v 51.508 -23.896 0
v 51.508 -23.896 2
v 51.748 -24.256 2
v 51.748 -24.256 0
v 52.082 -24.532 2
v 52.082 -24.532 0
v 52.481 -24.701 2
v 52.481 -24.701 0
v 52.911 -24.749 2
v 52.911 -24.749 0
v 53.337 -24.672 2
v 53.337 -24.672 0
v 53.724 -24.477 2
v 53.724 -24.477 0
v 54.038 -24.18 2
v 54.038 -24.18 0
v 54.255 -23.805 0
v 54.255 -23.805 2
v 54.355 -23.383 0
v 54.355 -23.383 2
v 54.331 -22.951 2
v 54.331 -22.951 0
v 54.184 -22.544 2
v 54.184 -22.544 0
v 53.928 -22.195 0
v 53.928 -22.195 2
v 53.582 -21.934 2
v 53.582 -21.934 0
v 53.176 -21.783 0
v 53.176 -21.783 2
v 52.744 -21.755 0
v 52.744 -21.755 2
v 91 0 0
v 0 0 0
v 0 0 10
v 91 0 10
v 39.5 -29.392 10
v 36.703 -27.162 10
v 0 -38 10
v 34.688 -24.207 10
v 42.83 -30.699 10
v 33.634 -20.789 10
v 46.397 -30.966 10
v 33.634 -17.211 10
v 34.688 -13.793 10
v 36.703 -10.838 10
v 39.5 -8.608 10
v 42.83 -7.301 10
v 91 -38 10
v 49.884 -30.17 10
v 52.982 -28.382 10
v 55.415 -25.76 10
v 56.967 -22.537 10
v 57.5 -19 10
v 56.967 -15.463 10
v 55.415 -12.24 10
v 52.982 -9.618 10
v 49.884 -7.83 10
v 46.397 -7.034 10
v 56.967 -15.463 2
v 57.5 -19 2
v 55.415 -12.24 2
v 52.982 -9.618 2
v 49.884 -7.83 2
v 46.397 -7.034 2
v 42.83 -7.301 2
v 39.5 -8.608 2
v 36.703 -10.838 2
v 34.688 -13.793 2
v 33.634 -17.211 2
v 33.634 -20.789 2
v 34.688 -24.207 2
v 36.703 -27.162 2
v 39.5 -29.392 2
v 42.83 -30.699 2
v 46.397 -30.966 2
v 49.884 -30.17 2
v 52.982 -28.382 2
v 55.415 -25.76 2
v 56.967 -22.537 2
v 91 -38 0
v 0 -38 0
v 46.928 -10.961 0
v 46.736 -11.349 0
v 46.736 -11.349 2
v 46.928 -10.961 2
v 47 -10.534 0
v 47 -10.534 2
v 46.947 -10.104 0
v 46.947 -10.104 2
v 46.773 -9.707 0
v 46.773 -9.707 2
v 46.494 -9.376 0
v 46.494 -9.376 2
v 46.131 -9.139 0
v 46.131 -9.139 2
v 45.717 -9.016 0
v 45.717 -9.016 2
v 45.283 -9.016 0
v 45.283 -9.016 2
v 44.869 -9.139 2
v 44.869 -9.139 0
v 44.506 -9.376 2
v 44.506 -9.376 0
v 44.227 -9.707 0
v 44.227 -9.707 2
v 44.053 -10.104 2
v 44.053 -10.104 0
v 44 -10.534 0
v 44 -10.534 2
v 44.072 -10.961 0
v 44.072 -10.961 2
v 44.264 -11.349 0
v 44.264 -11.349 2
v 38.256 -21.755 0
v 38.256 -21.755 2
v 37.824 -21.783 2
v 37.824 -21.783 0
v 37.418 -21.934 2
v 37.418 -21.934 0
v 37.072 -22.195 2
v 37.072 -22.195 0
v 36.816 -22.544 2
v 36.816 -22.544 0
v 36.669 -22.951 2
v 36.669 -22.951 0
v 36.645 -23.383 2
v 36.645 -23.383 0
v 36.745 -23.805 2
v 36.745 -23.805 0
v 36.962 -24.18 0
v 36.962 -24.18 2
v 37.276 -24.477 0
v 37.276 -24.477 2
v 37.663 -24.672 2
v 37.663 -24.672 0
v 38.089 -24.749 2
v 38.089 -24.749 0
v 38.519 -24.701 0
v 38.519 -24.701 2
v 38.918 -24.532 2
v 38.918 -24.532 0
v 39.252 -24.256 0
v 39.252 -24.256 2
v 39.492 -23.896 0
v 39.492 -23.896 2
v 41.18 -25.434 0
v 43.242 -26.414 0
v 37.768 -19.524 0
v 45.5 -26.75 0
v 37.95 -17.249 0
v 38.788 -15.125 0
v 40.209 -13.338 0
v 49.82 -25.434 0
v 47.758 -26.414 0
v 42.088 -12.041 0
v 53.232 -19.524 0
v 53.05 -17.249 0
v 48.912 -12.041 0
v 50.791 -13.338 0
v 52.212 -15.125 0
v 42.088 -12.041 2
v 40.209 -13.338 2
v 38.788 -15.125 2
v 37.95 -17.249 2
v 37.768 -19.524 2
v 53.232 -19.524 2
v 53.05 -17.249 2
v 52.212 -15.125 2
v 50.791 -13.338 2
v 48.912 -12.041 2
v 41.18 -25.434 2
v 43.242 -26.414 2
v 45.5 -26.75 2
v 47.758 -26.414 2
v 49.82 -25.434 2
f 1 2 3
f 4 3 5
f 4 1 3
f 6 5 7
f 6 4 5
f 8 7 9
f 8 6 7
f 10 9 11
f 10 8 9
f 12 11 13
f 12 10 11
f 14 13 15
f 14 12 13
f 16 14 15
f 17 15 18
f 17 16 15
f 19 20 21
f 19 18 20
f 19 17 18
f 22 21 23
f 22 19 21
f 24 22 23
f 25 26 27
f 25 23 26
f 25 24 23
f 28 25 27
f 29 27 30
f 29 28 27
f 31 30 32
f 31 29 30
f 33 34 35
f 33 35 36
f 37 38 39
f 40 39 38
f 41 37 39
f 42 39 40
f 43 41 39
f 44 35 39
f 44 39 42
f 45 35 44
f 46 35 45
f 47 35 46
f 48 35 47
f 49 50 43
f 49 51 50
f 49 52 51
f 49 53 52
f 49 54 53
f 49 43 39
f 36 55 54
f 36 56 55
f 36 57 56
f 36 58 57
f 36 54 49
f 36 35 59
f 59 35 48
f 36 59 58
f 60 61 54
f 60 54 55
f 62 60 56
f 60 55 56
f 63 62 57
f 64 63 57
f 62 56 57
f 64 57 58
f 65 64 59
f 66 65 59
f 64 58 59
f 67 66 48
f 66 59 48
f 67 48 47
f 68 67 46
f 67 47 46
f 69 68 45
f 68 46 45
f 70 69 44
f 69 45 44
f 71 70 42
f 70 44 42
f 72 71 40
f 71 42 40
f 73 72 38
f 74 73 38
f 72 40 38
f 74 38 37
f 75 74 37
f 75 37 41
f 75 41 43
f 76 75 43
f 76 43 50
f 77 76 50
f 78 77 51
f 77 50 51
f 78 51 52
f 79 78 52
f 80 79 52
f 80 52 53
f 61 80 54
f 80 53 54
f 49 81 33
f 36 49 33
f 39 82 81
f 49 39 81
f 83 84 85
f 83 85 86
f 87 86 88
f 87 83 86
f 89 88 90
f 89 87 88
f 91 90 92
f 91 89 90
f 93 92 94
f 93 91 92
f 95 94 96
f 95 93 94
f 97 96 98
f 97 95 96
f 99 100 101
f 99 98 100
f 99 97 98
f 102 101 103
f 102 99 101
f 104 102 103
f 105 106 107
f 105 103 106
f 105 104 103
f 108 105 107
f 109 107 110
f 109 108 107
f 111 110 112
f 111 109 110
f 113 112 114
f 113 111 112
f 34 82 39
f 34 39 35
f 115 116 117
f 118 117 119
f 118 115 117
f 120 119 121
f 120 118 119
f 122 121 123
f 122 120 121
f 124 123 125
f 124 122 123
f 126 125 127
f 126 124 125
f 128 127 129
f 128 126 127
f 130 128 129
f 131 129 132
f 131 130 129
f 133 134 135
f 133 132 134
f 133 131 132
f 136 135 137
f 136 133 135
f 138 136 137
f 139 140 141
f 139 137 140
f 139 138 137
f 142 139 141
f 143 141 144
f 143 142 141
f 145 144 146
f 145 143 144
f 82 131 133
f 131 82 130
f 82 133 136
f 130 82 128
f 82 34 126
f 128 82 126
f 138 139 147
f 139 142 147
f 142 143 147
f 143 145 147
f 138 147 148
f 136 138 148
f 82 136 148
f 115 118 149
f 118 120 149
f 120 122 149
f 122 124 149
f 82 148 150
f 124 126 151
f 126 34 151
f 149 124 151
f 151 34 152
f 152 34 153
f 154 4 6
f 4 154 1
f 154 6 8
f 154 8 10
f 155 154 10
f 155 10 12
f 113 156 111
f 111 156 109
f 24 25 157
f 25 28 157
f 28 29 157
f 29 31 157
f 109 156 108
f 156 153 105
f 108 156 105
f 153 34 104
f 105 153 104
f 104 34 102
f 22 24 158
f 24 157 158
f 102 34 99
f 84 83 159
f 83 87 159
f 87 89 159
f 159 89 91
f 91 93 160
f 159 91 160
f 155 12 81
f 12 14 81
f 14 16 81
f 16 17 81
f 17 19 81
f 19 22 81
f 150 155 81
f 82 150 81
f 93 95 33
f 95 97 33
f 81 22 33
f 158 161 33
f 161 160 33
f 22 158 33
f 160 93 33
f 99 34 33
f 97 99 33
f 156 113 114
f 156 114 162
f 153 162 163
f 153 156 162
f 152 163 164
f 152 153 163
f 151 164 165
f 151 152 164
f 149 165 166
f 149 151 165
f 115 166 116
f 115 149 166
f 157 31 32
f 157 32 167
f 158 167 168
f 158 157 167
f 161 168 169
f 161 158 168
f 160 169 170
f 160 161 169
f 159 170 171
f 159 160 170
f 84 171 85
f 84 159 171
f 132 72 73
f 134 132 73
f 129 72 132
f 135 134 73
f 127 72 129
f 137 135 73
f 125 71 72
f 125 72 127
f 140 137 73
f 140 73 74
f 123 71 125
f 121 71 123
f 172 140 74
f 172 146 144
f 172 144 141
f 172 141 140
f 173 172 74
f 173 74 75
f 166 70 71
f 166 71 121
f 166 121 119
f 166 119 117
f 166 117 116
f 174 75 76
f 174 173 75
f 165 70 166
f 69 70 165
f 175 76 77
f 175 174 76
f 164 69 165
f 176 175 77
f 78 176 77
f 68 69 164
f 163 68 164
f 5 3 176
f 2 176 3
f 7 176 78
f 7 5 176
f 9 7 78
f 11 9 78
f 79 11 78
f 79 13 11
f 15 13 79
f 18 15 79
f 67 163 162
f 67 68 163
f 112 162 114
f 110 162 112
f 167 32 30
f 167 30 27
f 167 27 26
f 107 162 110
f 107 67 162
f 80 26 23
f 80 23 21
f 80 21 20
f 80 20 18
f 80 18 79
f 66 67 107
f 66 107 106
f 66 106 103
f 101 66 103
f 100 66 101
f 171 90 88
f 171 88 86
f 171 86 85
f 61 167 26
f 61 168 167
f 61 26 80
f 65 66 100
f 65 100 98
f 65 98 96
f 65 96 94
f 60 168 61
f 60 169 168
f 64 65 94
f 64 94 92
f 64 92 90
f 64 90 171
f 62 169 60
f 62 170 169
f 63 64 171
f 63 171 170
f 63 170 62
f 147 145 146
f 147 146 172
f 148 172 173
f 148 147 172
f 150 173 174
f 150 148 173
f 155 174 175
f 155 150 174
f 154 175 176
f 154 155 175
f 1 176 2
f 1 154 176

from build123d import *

# Parameters (mm, degrees)
ESQUISSE1_W      = 91
ESQUISSE1_H      = 38
EXTRUSION1_DEPTH = 10
ESQUISSE3_R      = 12
EXTRUSION3_DEPTH = 8


with BuildPart() as part:
    # Esquisse1 → Extrusion1 (new body)
    with BuildSketch(Plane.XY):
        with Locations((45.5, -19)):
            Rectangle(ESQUISSE1_W, ESQUISSE1_H)
        with BuildLine():
            ThreePointArc((44.263573917, -11.349264706), (38.788303121, -15.125), (38.256055836, -21.754591249))
            ThreePointArc((38.256055836, -21.754591249), (36.839745962, -24), (39.492481919, -23.896144045))
            ThreePointArc((39.492481919, -23.896144045), (45.5, -26.75), (51.507518081, -23.896144045))
            ThreePointArc((51.507518081, -23.896144045), (54.160254038, -24), (52.743944164, -21.754591249))
            ThreePointArc((52.743944164, -21.754591249), (52.211696879, -15.125), (46.736426083, -11.349264706))
            ThreePointArc((46.736426083, -11.349264706), (45.5, -9), (44.263573917, -11.349264706))
        make_face(mode=Mode.SUBTRACT)
    extrude(amount=EXTRUSION1_DEPTH)

    # Esquisse3 → Extrusion3 (cut)
    with BuildSketch(Plane.XY.offset(10)):
        with Locations((45.5, -19)):
            Circle(ESQUISSE3_R)
    extrude(amount=-EXTRUSION3_DEPTH, mode=Mode.SUBTRACT)


solid = part.part
